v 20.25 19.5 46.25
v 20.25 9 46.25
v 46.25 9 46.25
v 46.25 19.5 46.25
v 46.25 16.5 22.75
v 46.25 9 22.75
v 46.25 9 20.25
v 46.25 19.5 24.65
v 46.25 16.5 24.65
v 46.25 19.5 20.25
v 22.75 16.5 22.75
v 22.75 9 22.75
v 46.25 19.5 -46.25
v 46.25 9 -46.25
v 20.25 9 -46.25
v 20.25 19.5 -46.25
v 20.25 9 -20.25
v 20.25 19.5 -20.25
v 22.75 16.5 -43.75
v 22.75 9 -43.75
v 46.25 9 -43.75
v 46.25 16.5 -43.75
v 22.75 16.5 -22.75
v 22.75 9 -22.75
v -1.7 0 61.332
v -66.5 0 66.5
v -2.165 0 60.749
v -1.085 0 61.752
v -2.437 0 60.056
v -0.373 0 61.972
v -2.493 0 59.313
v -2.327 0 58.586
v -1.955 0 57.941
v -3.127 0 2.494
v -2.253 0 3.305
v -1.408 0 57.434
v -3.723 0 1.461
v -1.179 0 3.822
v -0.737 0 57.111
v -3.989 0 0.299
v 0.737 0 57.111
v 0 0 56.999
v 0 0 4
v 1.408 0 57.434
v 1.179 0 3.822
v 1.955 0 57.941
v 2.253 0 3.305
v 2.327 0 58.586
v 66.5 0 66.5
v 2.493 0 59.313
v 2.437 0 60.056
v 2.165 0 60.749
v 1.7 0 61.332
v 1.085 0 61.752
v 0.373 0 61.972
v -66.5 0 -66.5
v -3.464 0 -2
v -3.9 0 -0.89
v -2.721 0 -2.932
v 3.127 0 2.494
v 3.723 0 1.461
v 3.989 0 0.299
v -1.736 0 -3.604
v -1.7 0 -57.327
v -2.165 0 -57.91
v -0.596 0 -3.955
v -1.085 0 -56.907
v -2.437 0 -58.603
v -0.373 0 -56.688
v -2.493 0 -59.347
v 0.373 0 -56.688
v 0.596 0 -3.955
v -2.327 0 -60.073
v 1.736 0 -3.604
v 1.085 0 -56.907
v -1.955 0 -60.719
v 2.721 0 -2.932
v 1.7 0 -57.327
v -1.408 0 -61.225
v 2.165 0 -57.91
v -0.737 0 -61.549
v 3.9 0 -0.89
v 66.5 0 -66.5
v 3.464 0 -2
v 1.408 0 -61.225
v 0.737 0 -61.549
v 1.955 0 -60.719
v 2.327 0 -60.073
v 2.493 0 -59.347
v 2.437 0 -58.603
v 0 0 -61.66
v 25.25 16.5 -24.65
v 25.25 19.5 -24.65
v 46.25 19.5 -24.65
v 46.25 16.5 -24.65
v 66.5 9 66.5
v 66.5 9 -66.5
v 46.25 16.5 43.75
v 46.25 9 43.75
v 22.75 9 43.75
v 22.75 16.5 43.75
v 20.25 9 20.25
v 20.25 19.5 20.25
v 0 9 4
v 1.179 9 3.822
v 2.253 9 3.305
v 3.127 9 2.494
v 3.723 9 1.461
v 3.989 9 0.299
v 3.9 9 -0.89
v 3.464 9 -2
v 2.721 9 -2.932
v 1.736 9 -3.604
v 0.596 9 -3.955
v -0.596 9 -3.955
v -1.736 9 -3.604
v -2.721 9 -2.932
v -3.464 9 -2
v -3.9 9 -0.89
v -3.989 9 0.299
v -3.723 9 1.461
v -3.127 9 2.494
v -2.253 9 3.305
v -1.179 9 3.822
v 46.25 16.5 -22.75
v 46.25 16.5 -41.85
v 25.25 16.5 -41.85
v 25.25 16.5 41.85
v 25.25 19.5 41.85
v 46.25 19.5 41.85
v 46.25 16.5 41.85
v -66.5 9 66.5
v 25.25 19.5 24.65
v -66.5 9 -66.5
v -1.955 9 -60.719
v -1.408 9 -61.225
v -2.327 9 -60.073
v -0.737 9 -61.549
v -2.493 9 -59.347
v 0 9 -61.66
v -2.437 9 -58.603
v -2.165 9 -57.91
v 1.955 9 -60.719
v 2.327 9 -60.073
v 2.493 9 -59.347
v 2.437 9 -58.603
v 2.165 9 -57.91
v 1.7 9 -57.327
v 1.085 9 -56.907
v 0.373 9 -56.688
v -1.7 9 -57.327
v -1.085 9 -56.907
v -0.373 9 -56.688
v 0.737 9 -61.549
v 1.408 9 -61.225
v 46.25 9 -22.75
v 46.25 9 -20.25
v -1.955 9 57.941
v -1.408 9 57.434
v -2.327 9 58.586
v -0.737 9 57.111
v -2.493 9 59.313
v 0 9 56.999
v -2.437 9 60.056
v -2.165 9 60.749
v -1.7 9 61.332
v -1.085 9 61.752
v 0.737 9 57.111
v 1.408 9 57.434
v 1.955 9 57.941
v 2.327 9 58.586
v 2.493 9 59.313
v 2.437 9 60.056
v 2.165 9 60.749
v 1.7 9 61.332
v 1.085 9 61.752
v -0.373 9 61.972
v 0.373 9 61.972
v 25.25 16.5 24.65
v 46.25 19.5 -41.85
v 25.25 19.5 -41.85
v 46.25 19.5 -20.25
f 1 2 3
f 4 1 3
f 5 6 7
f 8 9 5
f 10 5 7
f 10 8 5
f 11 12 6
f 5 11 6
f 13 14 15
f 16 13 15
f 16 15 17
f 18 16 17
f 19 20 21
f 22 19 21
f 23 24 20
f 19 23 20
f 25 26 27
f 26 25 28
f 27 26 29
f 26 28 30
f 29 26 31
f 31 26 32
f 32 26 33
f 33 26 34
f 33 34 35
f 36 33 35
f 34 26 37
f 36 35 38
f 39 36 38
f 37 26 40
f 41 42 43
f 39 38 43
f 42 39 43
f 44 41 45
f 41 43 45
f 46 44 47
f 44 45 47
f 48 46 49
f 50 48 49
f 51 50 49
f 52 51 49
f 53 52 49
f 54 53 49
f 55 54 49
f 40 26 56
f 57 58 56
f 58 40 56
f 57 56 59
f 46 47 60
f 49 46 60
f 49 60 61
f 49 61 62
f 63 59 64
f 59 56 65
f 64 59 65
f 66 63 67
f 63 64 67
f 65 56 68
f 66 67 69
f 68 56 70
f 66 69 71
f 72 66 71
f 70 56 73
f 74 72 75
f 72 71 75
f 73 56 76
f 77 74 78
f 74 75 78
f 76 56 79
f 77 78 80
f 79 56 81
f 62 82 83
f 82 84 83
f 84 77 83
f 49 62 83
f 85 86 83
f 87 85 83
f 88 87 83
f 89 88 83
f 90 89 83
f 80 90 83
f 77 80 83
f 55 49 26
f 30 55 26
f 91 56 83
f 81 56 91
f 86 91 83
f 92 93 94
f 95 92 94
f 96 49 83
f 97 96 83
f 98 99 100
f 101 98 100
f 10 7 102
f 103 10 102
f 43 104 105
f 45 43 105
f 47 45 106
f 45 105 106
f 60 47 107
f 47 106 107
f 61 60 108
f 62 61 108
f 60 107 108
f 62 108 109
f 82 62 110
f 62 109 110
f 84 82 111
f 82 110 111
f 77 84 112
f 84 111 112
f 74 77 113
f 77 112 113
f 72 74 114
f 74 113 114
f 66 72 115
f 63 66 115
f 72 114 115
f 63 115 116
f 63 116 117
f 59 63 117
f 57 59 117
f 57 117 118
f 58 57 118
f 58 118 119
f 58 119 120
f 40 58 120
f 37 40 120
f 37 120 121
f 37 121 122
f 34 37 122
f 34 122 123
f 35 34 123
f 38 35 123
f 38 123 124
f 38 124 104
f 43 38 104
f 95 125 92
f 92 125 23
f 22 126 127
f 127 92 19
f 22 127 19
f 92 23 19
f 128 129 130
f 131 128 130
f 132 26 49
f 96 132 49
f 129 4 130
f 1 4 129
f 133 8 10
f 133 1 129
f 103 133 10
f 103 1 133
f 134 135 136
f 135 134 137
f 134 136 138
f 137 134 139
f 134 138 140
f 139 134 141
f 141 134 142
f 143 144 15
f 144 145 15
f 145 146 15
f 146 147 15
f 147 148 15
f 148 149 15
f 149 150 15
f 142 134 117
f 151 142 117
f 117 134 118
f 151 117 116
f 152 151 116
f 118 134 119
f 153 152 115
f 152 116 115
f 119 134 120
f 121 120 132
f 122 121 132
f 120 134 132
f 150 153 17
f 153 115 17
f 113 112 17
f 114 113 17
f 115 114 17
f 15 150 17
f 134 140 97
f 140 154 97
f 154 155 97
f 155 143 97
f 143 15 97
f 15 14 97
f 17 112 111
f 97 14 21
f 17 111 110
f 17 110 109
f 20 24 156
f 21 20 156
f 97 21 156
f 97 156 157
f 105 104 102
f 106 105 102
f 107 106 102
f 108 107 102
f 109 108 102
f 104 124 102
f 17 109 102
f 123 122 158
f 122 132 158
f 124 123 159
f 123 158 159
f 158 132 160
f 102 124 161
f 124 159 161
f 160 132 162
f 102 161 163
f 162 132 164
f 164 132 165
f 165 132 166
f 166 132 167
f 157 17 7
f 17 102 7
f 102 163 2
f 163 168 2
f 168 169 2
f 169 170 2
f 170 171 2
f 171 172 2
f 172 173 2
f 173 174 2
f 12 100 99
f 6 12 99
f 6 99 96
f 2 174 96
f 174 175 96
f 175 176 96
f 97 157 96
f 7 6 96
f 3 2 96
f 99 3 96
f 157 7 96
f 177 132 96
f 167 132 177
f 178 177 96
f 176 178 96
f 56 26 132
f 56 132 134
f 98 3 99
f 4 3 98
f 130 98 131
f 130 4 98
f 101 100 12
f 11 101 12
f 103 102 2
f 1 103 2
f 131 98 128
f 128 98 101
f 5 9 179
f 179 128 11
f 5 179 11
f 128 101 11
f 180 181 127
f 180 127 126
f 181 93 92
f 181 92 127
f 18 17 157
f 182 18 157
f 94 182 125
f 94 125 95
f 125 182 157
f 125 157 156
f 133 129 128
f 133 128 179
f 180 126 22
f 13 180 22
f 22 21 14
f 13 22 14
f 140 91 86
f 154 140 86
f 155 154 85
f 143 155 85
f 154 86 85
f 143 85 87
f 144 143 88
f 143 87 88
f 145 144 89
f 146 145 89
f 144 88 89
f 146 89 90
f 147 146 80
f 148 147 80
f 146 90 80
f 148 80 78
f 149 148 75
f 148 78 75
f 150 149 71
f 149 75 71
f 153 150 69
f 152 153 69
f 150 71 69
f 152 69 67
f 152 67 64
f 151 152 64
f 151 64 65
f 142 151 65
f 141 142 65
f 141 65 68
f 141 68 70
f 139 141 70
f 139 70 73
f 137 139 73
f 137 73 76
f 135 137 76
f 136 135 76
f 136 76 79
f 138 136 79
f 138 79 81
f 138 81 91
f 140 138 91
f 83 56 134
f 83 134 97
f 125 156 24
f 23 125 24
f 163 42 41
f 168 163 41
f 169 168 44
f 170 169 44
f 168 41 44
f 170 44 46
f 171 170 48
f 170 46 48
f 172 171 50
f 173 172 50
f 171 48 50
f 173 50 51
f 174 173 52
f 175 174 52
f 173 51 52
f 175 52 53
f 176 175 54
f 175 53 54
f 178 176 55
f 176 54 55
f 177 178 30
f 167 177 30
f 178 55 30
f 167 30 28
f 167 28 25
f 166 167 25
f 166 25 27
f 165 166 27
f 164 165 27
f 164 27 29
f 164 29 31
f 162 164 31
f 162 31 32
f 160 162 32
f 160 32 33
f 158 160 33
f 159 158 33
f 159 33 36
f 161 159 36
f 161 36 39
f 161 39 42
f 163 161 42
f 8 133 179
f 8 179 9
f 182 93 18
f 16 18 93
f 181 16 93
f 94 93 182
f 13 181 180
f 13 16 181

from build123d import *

# Parameters (mm, degrees)
SKETCH1_W            = 133
SKETCH1_H            = 133
BOSS_EXTRUDE2_DEPTH  = 136
SKETCH2_W            = 133
SKETCH2_H            = 118
CUT_EXTRUDE1_DEPTH   = 136
BOSS_EXTRUDE3_DEPTH  = 10.5
SKETCH5_W            = 21
SKETCH5_H            = 3
BOSS_EXTRUDE4_DEPTH  = 23.5
SKETCH6_W            = 42
SKETCH6_H            = 17.2
CUT_EXTRUDE2_DEPTH   = 3
BOSS_EXTRUDE5_DEPTH  = 10.5
SKETCH8_W            = 21
SKETCH8_H            = 3
BOSS_EXTRUDE6_DEPTH  = 23.5
SKETCH9_W            = 42
SKETCH9_H            = 17.2
CUT_EXTRUDE3_DEPTH   = 3
SKETCH10_W           = 19.261488562
SKETCH10_H           = 133
BOSS_EXTRUDE7_DEPTH  = 5
SKETCH11_W           = 18.43727499
SKETCH11_H           = 133
BOSS_EXTRUDE8_DEPTH  = 5
SKETCH12_W           = 18.849381776
SKETCH12_H           = 146
BOSS_EXTRUDE9_DEPTH  = 12
SKETCH14_W           = 18.849381776
SKETCH14_H           = 146
BOSS_EXTRUDE10_DEPTH = 12
SKETCH17_R           = 1
CUT_EXTRUDE4_DEPTH   = 222.251553667
SKETCH20_W           = 133.244561713
SKETCH20_H           = 5
CUT_EXTRUDE10_DEPTH  = 19
SKETCH21_W           = 157
SKETCH21_H           = 120.66580897
CUT_EXTRUDE11_DEPTH  = 118
SKETCH22_W           = 186.174267818
SKETCH22_H           = 42.2523161
CUT_EXTRUDE12_DEPTH  = 118
SKETCH23_W           = 12
SKETCH23_H           = 25.33419103
CUT_EXTRUDE13_DEPTH  = 118
SKETCH24_W           = 12
SKETCH24_H           = 25.33419103
CUT_EXTRUDE14_DEPTH  = 118
SKETCH31_R           = 2.5
CUT_EXTRUDE21_DEPTH  = 118
SKETCH32_R           = 2.5
CUT_EXTRUDE22_DEPTH  = 118
SKETCH33_W           = 133
SKETCH33_H           = 5
CUT_EXTRUDE24_DEPTH  = 118
SKETCH34_R           = 2.5
CUT_EXTRUDE25_DEPTH  = 118
SKETCH35_R           = 4
CUT_EXTRUDE26_DEPTH  = 10


with BuildPart() as part:
    # Sketch1 → Boss-Extrude2 (new body)
    with BuildSketch(Plane(origin=(0, 0, 0), x_dir=(1, 0, 0), z_dir=(0, 1, 0))):
        Rectangle(SKETCH1_W, SKETCH1_H)
    extrude(amount=BOSS_EXTRUDE2_DEPTH)

    # Sketch2 → Cut-Extrude1 (cut)
    with BuildSketch(Plane.XY.offset(66.5)):
        with Locations((0, 68)):
            Rectangle(SKETCH2_W, SKETCH2_H)
    extrude(amount=-CUT_EXTRUDE1_DEPTH, mode=Mode.SUBTRACT)


with BuildPart() as cut_extrude1_piece_1:
    # of the separate pieces the step leaves, piece 1, a body of its own (cut_extrude1_pieces)
    add(part.part.solids().sort_by_distance((-66.5, 0, 66.5))[0])

    # Sketch4 → Boss-Extrude3 (add)
    with BuildSketch(Plane(origin=(0, 9, 0), x_dir=(1, 0, 0), z_dir=(0, 1, 0))):
        Polygon((22.75, -22.75), (43.75, -22.75), (46.25, -22.75), (46.25, -20.25), (20.25, -20.25), (20.25, -46.25), (46.25, -46.25), (46.25, -43.75), (43.75, -43.75), (22.75, -43.75), align=None)
        Polygon((22.75, 43.75), (43.75, 43.75), (46.25, 43.75), (46.25, 46.25), (20.25, 46.25), (20.25, 20.25), (46.25, 20.25), (46.25, 22.75), (43.75, 22.75), (22.75, 22.75), align=None)
    extrude(amount=BOSS_EXTRUDE3_DEPTH)

    # Sketch5 → Boss-Extrude4 (add)
    with BuildSketch(Plane(origin=(22.75, 0, 0), x_dir=(0, 0, -1), z_dir=(1, 0, 0))):
        with Locations((-33.25, 18)):
            Rectangle(SKETCH5_W, SKETCH5_H)
        with Locations((33.25, 18)):
            Rectangle(SKETCH5_W, SKETCH5_H)
    extrude(amount=BOSS_EXTRUDE4_DEPTH)

    # Sketch6 → Cut-Extrude2 (cut)
    with BuildSketch(Plane(origin=(0, 19.5, 0), x_dir=(1, 0, 0), z_dir=(0, 1, 0))):
        with Locations((46.25, -33.25)):
            Rectangle(SKETCH6_W, SKETCH6_H)
        with Locations((46.25, 33.25)):
            Rectangle(SKETCH6_W, SKETCH6_H)
    extrude(amount=-CUT_EXTRUDE2_DEPTH, mode=Mode.SUBTRACT)

    # Sketch10 → Boss-Extrude7 (add)
    with BuildSketch(Plane.XZ):
        Rectangle(SKETCH10_W, SKETCH10_H)
    extrude(amount=BOSS_EXTRUDE7_DEPTH)



with BuildPart() as cut_extrude1_piece_2:
    # of the separate pieces the step leaves, piece 2, a body of its own (cut_extrude1_pieces)
    add(part.part.solids().sort_by_distance((66.5, 127, 66.5))[0])

    # Sketch7 → Boss-Extrude5 (add)
    with BuildSketch(Plane.XZ.offset(-127)):
        Polygon((-43.75, 43.75), (-22.75, 43.75), (-22.75, 22.75), (-43.75, 22.75), (-46.25, 22.75), (-46.25, 20.25), (-20.25, 20.25), (-20.25, 46.25), (-46.25, 46.25), (-46.25, 43.75), align=None)
        Polygon((-43.75, -22.75), (-22.75, -22.75), (-22.75, -43.75), (-43.75, -43.75), (-46.25, -43.75), (-46.25, -46.25), (-20.25, -46.25), (-20.25, -20.25), (-46.25, -20.25), (-46.25, -22.75), align=None)
    extrude(amount=BOSS_EXTRUDE5_DEPTH)

    # Sketch8 → Boss-Extrude6 (add)
    with BuildSketch(Plane.ZY.offset(22.75)):
        with Locations((33.25, 118)):
            Rectangle(SKETCH8_W, SKETCH8_H)
        with Locations((-33.25, 118)):
            Rectangle(SKETCH8_W, SKETCH8_H)
    extrude(amount=BOSS_EXTRUDE6_DEPTH)

    # Sketch9 → Cut-Extrude3 (cut)
    with BuildSketch(Plane.XZ.offset(-116.5)):
        with Locations((-46.25, 33.25)):
            Rectangle(SKETCH9_W, SKETCH9_H)
        with Locations((-46.25, -33.25)):
            Rectangle(SKETCH9_W, SKETCH9_H)
    extrude(amount=-CUT_EXTRUDE3_DEPTH, mode=Mode.SUBTRACT)

    # Sketch11 → Boss-Extrude8 (add)
    with BuildSketch(Plane(origin=(0, 136, 0), x_dir=(1, 0, 0), z_dir=(0, 1, 0))):
        Rectangle(SKETCH11_W, SKETCH11_H)
    extrude(amount=BOSS_EXTRUDE8_DEPTH)


with BuildPart() as cut_extrude1_piece_1_1:
    add(cut_extrude1_piece_1.part)

    add(cut_extrude1_piece_2.part)  # Boss-Extrude9 merges Cut-Extrude1 piece 2
    # Sketch12 → Boss-Extrude9 (add)
    with BuildSketch(Plane(origin=(0, 0, -66.5), x_dir=(-1, 0, 0), z_dir=(0, 0, -1))):
        with Locations((-0.206053393, 68)):
            Rectangle(SKETCH12_W, SKETCH12_H)
    extrude(amount=BOSS_EXTRUDE9_DEPTH)

    # Sketch14 → Boss-Extrude10 (add)
    with BuildSketch(Plane.XY.offset(66.5)):
        with Locations((0.206053393, 68)):
            Rectangle(SKETCH14_W, SKETCH14_H)
    extrude(amount=BOSS_EXTRUDE10_DEPTH)

    # Sketch17 → Cut-Extrude4 (cut, through all)
    with BuildSketch(Plane.XY.offset(78.5)):
        with Locations((0.206053393, 68)):
            Circle(SKETCH17_R)
    extrude(amount=-CUT_EXTRUDE4_DEPTH, mode=Mode.SUBTRACT)

    # Sketch20 → Cut-Extrude10 (cut)
    with BuildSketch(Plane.ZY.offset(9.218637495)):
        with Locations((0.122280857, 138.5)):
            Rectangle(SKETCH20_W, SKETCH20_H)
    extrude(amount=-CUT_EXTRUDE10_DEPTH, mode=Mode.SUBTRACT)

    # Sketch21 → Cut-Extrude11 (cut)
    with BuildSketch(Plane.ZY.offset(9.218637495)):
        with Locations((0, 80.667095515)):
            Rectangle(SKETCH21_W, SKETCH21_H)
    extrude(amount=-CUT_EXTRUDE11_DEPTH, mode=Mode.SUBTRACT)


with BuildPart() as cut_extrude11_piece_1:
    # of the separate pieces the step leaves, piece 1, a body of its own (cut_extrude11_pieces)
    add(cut_extrude1_piece_1_1.part.solids().sort_by_distance((9.630744281, 20.33419103, 66.5))[0])

    # Sketch23 → Cut-Extrude13 (cut)
    with BuildSketch(Plane.ZY.offset(9.218637495)):
        with Locations((-72.5, 7.667095515)):
            Rectangle(SKETCH23_W, SKETCH23_H)
    extrude(amount=-CUT_EXTRUDE13_DEPTH, mode=Mode.SUBTRACT)

    # Sketch24 → Cut-Extrude14 (cut)
    with BuildSketch(Plane.ZY.offset(9.218637495)):
        with Locations((72.5, 7.667095515)):
            Rectangle(SKETCH24_W, SKETCH24_H)
    extrude(amount=-CUT_EXTRUDE14_DEPTH, mode=Mode.SUBTRACT)

    # Sketch31 → Cut-Extrude21 (cut)
    with BuildSketch(Plane.XZ.offset(5)):
        with Locations(Location((0, 59.499471122, 0), (0, 0, 270))):
            Circle(SKETCH31_R)
    extrude(amount=-CUT_EXTRUDE21_DEPTH, mode=Mode.SUBTRACT)

    # Sketch32 → Cut-Extrude22 (cut)
    with BuildSketch(Plane.XZ.offset(5)):
        with Locations(Location((0, -59.159797643, 0), (0, 0, 270))):
            Circle(SKETCH32_R)
    extrude(amount=-CUT_EXTRUDE22_DEPTH, mode=Mode.SUBTRACT)

    # Sketch33 → Cut-Extrude24 (cut)
    with BuildSketch(Plane.ZY.offset(9.630744281)):
        with Locations((0, -2.5)):
            Rectangle(SKETCH33_W, SKETCH33_H)
    extrude(amount=-CUT_EXTRUDE24_DEPTH, mode=Mode.SUBTRACT)

    # Sketch34 → Cut-Extrude25 (cut)
    with BuildSketch(Plane(origin=(0, 9, 0), x_dir=(1, 0, 0), z_dir=(0, 1, 0))):
        with Locations(Location((0, 0, 0), (0, 0, 270))):
            Circle(SKETCH34_R)
    extrude(amount=-CUT_EXTRUDE25_DEPTH, mode=Mode.SUBTRACT)

    # Sketch35 → Cut-Extrude26 (cut)
    with BuildSketch(Plane(origin=(0, 9, 0), x_dir=(1, 0, 0), z_dir=(0, 1, 0))):
        with Locations(Location((0, 0, 0), (0, 0, 270))):
            Circle(SKETCH35_R)
    extrude(amount=-CUT_EXTRUDE26_DEPTH, mode=Mode.SUBTRACT)


with BuildPart() as cut_extrude11_piece_2:
    # of the separate pieces the step leaves, piece 2, a body of its own (cut_extrude11_pieces)
    add(cut_extrude1_piece_1_1.part.solids().sort_by_distance((-9.218637495, 127, 66.5))[0])

    # Sketch22 → Cut-Extrude12 (cut)
    with BuildSketch(Plane.ZY.offset(66.5)):
        with Locations((20.706035589, 120.536042421)):
            Rectangle(SKETCH22_W, SKETCH22_H)
    extrude(amount=-CUT_EXTRUDE12_DEPTH, mode=Mode.SUBTRACT)


solid = cut_extrude11_piece_1.part
